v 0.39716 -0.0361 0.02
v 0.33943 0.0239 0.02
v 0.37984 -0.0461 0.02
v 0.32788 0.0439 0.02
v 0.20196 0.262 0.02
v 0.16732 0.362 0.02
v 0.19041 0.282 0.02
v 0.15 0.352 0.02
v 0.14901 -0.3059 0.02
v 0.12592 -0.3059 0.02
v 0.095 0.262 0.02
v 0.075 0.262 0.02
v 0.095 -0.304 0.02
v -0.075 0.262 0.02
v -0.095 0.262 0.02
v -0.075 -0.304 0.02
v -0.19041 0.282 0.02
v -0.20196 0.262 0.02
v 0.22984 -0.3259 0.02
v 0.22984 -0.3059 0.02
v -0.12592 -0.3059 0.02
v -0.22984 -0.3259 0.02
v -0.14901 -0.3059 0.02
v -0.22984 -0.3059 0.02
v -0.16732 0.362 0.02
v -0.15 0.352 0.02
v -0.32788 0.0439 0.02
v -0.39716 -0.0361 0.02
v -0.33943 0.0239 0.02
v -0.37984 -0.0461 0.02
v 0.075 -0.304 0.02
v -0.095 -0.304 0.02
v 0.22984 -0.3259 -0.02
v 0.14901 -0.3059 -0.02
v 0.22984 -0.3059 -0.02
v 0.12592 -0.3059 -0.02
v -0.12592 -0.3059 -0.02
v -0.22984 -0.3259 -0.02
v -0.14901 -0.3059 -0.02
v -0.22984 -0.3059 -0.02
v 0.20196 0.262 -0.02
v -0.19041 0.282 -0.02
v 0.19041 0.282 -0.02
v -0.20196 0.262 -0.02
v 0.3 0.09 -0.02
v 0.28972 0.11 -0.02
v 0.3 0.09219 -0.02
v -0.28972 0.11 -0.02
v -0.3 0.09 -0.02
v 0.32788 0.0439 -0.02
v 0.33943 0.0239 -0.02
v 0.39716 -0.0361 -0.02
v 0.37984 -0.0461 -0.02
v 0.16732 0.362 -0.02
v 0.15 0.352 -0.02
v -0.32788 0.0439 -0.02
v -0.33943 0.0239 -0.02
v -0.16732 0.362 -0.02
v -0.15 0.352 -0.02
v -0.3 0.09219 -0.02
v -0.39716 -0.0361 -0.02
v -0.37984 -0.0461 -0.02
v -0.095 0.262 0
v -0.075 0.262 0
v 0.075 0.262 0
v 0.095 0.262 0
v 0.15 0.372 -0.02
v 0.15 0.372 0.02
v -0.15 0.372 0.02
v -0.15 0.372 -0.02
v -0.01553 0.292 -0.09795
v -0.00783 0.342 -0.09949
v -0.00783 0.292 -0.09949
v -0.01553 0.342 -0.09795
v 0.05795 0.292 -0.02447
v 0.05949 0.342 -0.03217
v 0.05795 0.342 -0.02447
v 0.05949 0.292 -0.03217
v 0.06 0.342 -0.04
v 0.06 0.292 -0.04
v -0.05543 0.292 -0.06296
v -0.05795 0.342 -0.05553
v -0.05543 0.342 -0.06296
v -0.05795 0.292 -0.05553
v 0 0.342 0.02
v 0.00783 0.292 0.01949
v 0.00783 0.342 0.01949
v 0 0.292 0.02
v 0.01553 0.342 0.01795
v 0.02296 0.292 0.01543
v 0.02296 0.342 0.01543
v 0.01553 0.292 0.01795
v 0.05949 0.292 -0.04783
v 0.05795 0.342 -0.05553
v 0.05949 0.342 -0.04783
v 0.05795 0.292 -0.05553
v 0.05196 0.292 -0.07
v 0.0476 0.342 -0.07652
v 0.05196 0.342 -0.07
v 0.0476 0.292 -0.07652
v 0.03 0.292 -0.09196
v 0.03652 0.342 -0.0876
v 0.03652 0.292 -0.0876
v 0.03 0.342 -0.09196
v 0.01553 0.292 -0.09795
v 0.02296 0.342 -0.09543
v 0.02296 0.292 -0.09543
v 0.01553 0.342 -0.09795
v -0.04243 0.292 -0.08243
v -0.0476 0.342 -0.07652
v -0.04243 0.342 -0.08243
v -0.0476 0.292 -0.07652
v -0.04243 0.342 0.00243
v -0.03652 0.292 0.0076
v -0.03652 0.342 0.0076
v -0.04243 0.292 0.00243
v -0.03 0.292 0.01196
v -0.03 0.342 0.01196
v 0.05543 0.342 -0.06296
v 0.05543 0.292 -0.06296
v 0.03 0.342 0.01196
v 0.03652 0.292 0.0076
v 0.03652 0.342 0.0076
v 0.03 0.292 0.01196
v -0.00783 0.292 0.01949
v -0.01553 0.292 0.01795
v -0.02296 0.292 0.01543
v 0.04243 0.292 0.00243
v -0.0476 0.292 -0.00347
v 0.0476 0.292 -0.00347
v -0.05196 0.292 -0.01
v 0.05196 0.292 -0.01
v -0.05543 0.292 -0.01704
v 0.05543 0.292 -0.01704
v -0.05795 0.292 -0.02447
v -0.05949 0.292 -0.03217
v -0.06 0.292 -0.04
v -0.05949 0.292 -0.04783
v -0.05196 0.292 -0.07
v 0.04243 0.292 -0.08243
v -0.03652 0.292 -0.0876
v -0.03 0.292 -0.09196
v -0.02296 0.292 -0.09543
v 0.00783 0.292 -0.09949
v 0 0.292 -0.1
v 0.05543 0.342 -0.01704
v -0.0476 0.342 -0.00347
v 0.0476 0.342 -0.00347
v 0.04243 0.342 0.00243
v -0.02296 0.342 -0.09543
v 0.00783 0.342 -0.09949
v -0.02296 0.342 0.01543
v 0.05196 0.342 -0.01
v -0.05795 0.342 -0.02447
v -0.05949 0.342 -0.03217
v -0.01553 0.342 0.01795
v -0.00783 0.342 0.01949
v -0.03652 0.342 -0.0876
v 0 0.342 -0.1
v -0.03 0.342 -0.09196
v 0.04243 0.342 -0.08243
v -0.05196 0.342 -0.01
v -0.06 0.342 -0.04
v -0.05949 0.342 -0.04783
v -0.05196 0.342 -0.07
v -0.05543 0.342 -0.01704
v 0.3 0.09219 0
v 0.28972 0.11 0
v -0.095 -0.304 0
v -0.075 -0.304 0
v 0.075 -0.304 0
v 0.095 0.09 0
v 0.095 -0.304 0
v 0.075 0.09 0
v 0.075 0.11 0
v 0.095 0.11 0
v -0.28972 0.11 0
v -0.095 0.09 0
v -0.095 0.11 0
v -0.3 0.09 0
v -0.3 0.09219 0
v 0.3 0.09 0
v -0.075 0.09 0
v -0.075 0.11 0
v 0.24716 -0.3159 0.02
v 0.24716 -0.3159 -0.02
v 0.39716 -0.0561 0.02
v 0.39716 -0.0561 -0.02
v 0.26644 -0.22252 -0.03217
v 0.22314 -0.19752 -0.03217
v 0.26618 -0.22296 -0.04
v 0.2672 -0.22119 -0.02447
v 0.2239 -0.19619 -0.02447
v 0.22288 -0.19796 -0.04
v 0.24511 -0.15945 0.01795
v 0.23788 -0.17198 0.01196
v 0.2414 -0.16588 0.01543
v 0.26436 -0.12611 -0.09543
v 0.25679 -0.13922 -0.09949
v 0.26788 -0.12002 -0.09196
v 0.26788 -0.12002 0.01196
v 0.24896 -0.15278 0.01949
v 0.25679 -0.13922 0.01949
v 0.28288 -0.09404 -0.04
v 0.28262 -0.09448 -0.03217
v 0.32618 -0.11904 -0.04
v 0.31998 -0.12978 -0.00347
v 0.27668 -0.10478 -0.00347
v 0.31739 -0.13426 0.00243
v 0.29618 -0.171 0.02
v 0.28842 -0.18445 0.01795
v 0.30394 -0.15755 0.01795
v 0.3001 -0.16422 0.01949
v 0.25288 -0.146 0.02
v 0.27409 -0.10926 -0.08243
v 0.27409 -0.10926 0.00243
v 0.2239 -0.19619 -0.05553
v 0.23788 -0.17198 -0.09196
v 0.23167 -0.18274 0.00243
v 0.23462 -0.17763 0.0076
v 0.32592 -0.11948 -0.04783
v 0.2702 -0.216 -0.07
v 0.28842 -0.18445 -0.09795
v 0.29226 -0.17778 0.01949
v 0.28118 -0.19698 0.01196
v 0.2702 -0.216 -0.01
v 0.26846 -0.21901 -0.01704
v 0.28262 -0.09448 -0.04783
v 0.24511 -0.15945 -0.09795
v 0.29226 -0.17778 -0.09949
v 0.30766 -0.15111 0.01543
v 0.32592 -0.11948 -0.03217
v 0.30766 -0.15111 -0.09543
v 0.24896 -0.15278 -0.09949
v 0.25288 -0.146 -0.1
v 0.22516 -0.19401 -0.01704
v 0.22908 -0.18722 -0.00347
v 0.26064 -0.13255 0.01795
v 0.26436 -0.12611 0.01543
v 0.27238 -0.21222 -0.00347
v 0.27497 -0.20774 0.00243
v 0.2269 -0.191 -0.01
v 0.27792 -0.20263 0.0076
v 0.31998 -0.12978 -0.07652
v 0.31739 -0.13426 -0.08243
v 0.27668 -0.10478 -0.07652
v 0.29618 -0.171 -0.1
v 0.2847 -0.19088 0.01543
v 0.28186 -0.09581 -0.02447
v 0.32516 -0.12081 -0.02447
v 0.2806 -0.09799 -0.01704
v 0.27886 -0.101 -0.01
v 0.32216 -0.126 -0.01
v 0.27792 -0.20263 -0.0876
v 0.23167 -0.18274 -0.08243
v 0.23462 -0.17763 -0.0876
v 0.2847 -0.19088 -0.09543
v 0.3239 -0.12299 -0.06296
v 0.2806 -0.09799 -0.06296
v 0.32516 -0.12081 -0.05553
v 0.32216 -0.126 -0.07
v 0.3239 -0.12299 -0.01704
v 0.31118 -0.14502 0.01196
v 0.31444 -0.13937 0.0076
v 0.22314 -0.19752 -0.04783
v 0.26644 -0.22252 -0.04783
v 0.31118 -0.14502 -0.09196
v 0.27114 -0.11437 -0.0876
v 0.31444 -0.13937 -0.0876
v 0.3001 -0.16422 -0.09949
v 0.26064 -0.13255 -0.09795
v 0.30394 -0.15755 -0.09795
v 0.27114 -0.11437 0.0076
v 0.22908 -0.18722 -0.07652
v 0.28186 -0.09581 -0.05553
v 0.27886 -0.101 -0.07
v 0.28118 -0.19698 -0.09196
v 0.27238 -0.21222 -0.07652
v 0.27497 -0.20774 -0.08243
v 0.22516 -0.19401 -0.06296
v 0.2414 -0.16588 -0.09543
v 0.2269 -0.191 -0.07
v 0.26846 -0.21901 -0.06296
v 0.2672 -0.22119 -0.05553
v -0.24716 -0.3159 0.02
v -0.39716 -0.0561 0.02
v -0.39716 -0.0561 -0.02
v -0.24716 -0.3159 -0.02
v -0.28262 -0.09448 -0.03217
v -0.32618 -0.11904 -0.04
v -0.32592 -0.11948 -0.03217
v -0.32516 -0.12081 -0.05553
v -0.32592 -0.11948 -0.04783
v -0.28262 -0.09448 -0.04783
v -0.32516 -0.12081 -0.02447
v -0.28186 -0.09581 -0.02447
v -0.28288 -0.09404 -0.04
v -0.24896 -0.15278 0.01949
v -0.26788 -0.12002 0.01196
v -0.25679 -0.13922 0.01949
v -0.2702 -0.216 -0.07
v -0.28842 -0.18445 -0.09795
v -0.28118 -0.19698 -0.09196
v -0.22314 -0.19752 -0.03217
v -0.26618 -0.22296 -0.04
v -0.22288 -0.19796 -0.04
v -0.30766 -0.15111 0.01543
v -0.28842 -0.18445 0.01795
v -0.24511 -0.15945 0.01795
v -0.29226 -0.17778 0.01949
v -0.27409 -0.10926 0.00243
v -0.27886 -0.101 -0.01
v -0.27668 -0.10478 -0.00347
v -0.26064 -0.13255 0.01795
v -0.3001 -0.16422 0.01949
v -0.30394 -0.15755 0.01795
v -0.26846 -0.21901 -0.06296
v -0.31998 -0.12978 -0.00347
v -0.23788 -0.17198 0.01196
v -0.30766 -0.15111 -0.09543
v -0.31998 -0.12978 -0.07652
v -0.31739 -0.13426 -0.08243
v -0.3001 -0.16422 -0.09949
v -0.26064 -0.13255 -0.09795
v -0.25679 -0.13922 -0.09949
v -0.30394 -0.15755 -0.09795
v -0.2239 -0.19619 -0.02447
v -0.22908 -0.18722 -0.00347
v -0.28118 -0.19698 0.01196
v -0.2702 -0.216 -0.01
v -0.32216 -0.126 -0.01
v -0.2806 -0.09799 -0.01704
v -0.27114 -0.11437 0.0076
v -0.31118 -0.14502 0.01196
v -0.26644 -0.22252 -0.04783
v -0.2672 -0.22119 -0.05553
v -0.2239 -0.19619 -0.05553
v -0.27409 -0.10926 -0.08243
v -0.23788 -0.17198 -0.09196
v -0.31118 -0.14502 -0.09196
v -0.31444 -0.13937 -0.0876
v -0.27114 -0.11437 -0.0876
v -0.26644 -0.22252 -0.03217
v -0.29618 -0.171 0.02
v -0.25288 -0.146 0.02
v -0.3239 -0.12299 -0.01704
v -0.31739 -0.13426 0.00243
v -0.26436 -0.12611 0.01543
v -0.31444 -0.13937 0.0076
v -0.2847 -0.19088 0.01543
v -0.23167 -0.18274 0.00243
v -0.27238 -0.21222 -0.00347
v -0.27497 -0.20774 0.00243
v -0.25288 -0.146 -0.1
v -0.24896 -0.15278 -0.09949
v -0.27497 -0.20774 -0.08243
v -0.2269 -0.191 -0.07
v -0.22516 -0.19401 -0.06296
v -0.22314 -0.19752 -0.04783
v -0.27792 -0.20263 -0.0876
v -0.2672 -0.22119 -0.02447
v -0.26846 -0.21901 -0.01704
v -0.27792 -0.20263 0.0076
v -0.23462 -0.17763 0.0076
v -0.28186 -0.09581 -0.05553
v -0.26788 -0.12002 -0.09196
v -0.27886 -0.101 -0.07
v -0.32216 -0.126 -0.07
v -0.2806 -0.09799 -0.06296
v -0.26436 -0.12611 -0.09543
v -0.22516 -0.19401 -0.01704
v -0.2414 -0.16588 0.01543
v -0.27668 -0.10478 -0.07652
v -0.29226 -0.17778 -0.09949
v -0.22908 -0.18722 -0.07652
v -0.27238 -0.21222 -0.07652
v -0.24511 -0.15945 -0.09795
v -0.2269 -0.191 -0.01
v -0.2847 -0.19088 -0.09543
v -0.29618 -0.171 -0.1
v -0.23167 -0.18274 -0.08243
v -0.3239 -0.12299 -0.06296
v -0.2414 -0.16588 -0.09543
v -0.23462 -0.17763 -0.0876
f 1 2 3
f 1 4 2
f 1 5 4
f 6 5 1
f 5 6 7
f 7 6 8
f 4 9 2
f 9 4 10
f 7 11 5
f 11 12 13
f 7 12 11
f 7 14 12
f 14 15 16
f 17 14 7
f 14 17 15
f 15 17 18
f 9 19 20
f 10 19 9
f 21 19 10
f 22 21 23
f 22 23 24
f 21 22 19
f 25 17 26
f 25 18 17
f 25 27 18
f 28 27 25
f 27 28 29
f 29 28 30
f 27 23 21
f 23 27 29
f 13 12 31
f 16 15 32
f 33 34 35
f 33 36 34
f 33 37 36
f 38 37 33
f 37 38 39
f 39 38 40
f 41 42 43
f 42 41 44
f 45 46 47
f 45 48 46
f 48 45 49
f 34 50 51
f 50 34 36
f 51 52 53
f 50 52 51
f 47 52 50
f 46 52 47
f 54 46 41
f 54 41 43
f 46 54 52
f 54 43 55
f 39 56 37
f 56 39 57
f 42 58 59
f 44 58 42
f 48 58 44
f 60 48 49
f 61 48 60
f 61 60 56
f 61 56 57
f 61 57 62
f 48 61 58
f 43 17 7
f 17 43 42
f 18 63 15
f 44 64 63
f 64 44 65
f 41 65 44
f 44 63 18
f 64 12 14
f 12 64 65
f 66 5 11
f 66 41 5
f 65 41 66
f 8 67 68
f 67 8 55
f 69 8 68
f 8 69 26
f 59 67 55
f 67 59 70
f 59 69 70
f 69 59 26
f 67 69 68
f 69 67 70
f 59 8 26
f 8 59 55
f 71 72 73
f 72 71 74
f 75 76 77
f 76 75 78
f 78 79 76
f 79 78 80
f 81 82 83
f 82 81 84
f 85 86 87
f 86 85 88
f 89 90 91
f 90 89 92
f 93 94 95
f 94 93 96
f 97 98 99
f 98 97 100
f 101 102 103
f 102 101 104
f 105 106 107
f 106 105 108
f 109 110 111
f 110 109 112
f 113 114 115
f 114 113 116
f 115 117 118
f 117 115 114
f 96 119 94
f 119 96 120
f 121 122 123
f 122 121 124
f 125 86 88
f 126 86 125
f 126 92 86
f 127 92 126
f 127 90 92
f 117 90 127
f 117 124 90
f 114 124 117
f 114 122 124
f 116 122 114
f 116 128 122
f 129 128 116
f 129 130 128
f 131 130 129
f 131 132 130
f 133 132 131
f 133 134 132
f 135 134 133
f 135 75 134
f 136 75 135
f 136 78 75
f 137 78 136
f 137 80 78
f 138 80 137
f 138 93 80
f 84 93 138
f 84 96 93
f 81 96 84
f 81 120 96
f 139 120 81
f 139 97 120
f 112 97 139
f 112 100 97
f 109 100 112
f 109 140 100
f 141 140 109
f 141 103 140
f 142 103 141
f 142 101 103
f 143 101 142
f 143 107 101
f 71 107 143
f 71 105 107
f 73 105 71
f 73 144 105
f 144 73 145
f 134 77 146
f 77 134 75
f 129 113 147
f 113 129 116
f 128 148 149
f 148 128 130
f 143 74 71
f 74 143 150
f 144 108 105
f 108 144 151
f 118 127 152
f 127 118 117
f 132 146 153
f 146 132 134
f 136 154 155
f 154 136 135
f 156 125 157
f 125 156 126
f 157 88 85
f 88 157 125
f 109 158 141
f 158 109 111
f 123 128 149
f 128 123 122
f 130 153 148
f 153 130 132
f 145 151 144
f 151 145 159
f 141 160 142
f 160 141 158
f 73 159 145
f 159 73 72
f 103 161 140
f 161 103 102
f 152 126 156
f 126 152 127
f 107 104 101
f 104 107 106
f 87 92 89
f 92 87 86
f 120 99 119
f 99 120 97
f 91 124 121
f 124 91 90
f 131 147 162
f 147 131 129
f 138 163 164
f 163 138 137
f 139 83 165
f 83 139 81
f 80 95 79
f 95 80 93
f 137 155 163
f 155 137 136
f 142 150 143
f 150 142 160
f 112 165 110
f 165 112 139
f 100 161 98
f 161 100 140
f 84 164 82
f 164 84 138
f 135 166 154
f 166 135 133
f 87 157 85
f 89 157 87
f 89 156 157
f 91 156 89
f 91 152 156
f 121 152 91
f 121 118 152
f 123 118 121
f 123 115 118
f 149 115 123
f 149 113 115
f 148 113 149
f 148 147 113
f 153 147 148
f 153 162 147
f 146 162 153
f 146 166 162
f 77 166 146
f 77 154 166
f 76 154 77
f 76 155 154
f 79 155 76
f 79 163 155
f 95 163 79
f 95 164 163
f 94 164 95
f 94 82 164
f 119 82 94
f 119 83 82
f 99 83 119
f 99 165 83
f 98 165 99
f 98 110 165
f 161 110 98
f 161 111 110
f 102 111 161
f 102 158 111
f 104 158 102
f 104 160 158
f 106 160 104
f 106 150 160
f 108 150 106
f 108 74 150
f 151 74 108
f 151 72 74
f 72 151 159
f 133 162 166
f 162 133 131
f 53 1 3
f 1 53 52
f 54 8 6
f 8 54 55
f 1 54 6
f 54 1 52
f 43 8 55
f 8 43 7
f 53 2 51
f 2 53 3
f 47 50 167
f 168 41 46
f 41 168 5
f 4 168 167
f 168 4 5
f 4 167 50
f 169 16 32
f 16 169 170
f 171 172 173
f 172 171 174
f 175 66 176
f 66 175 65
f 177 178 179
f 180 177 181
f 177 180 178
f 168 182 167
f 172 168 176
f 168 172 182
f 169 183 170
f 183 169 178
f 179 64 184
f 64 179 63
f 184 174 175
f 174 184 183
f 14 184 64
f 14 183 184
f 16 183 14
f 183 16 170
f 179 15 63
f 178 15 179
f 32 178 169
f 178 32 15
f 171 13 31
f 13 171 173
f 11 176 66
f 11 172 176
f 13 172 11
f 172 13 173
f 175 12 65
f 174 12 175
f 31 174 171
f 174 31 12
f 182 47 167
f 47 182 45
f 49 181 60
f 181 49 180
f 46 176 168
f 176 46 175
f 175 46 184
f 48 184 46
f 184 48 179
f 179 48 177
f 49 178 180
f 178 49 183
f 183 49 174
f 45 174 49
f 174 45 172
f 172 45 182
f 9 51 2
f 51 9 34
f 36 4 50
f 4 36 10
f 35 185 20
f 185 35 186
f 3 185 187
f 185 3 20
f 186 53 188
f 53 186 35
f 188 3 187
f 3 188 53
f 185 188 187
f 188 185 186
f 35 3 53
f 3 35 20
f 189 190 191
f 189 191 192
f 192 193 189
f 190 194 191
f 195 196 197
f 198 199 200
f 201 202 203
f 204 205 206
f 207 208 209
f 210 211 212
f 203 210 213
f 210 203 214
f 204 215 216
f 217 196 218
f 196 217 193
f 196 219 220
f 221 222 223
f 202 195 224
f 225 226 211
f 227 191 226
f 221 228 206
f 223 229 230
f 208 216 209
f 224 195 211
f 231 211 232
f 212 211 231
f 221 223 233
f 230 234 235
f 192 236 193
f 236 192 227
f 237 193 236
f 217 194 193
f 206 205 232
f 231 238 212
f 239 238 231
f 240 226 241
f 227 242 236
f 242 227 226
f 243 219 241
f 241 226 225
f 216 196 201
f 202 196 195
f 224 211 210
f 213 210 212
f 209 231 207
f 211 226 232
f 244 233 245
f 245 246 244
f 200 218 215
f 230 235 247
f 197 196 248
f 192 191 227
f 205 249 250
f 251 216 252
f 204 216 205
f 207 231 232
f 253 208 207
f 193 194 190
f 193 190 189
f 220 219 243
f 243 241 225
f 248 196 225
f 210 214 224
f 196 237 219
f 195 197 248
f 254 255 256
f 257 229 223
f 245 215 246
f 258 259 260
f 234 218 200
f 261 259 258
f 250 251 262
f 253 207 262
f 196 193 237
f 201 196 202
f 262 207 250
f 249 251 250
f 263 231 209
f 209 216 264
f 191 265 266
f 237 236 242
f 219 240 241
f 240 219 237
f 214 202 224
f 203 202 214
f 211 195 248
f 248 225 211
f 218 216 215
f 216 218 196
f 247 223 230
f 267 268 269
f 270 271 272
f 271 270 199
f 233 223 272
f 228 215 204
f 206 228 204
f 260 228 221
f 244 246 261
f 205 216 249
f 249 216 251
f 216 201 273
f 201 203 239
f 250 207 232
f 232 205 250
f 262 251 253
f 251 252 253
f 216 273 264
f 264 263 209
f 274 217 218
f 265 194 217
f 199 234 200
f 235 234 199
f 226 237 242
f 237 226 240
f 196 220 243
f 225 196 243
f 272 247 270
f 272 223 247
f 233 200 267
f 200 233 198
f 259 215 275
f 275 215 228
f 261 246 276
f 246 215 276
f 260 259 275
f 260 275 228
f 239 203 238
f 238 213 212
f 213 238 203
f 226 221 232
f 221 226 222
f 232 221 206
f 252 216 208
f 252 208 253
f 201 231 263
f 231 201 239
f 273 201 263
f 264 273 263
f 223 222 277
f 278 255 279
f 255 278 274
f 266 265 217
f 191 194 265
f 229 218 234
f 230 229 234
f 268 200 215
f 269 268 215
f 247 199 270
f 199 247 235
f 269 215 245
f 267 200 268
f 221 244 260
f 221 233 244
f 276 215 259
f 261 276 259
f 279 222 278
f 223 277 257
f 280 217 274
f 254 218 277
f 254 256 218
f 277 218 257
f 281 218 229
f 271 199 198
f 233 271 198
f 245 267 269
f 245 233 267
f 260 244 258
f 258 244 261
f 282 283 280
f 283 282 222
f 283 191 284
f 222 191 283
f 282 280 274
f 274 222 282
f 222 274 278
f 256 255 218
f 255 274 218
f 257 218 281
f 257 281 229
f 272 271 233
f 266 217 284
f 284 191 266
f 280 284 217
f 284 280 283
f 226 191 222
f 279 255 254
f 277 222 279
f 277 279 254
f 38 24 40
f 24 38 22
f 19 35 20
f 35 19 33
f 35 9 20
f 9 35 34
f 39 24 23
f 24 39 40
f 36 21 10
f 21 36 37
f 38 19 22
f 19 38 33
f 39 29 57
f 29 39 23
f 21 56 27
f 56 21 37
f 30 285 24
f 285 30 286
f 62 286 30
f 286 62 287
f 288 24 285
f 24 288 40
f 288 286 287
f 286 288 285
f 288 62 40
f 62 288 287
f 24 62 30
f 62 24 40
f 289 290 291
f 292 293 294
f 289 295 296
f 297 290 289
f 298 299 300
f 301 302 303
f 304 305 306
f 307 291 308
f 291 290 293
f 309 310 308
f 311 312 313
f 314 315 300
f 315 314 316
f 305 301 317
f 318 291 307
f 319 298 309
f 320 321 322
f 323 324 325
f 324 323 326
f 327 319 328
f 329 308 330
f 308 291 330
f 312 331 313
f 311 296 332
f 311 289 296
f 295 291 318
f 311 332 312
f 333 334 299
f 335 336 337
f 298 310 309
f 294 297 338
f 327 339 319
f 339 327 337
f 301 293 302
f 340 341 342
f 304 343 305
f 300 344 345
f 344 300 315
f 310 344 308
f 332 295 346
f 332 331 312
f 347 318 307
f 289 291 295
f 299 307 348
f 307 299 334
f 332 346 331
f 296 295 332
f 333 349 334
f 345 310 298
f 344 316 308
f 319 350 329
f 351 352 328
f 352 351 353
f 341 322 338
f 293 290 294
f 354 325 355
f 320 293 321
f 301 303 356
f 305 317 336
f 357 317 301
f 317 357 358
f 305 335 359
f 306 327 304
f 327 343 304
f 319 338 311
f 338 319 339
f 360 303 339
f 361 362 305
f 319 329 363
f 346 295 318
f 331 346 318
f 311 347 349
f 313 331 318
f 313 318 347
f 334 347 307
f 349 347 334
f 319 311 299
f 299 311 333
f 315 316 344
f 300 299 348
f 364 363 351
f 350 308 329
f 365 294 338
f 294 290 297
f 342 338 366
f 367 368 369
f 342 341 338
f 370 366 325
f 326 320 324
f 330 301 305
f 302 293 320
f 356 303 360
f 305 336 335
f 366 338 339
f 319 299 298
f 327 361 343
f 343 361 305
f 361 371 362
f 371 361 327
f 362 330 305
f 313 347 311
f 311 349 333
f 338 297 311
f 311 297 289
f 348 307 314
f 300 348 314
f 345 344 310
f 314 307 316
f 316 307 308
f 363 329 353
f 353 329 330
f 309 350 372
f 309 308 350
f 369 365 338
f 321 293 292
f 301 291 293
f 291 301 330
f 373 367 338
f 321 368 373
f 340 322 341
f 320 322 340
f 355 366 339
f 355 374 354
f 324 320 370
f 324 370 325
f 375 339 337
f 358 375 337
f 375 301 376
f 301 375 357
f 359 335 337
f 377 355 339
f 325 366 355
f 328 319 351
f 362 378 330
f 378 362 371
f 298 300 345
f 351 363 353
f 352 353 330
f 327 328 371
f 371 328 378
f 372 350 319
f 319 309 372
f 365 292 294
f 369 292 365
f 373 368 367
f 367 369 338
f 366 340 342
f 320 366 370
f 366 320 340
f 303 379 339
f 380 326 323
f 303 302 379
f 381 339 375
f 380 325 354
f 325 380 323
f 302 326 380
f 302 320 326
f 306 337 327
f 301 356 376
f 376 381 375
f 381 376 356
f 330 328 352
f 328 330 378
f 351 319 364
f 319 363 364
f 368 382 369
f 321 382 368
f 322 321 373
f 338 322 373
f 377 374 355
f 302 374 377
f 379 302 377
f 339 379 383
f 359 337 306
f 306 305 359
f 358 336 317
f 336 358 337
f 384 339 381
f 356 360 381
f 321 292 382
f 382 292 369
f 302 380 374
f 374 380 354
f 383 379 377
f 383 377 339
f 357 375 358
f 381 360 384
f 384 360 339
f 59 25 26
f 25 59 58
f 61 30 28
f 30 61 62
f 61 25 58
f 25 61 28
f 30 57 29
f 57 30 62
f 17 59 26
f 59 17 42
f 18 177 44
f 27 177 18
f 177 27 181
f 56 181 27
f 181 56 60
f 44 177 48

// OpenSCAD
// Generated by SolidPython 1.1.3 on 2023-11-28 11:05:10
$fn = 48;


union() {
	union() {
		color(alpha = 1.0000000000, c = "Red") {
			translate(v = [0.   ,0.272,0.   ]) {
				rotate(a = [0, 0, -0.0000000000]) {
					cube(center = true, size = [0.41547005383792507, 0.0200000000, 0.0400000000]);
				}
			}
		}
	}
	union() {
		color(alpha = 1.0000000000, c = "Orange") {
			translate(v = [0.   ,0.362,0.   ]) {
				rotate(a = [0, 0, -0.0000000000]) {
					cube(center = true, size = [0.3000000000, 0.0200000000, 0.0400000000]);
				}
			}
		}
	}
	union() {
		color(alpha = 1.0000000000, c = "Green") {
			translate(v = [ 0.   , 0.317,-0.04 ]) {
				rotate(a = [90, 0, -0.0000000000]) {
					cylinder(center = true, h = 0.0500000000, r = 0.0600000000);
				}
			}
		}
	}
	union() {
		color(alpha = 1.0000000000, c = "Purple") {
			translate(v = [0.27358073,0.15795191,0.        ]) {
				rotate(a = [0, 0, -60.0000000000]) {
					cube(center = true, size = [0.4596818842642447, 0.0200000000, 0.0400000000]);
				}
			}
		}
	}
	union() {
		color(alpha = 1.0000000000, c = "Yellow") {
			translate(v = [-0.0850000000, -0.0200000000, 0.0100000000]) {
				rotate(a = [0, 0, -90]) {
					cube(center = true, size = [0.5680000000, 0.0200000000, 0.0200000000]);
				}
			}
		}
	}
	union() {
		color(alpha = 1.0000000000, c = "Yellow") {
			translate(v = [0.0850000000, -0.0200000000, 0.0100000000]) {
				rotate(a = [0, 0, -90]) {
					cube(center = true, size = [0.5680000000, 0.0200000000, 0.0200000000]);
				}
			}
		}
	}
	union() {
		color(alpha = 1.0000000000, c = "Yellow") {
			translate(v = [0, 0.1000000000, -0.0100000000]) {
				cube(center = true, size = [0.6000000000, 0.0200000000, 0.0200000000]);
			}
		}
	}
	union() {
		color(alpha = 1.0000000000, c = "Red") {
			translate(v = [ 0.23555891,-0.136     , 0.        ]) {
				rotate(a = [0, 0, -120.0000000000]) {
					cube(center = true, size = [0.41547005383792507, 0.0200000000, 0.0400000000]);
				}
			}
		}
	}
	union() {
		color(alpha = 1.0000000000, c = "Orange") {
			translate(v = [ 0.3135012,-0.181    , 0.       ]) {
				rotate(a = [0, 0, -120.0000000000]) {
					cube(center = true, size = [0.3000000000, 0.0200000000, 0.0400000000]);
				}
			}
		}
	}
	union() {
		color(alpha = 1.0000000000, c = "Green") {
			translate(v = [ 0.27453005,-0.1585    ,-0.04      ]) {
				rotate(a = [90, 0, -120.0000000000]) {
					cylinder(center = true, h = 0.0500000000, r = 0.0600000000);
				}
			}
		}
	}
	union() {
		color(alpha = 1.0000000000, c = "Purple") {
			translate(v = [ 3.86870590e-17,-3.15903811e-01, 0.00000000e+00]) {
				rotate(a = [0, 0, -180.0000000000]) {
					cube(center = true, size = [0.4596818842642447, 0.0200000000, 0.0400000000]);
				}
			}
		}
	}
	union() {
		color(alpha = 1.0000000000, c = "Yellow") {
			translate(v = [-0.0850000000, -0.0200000000, 0.0100000000]) {
				rotate(a = [0, 0, -90]) {
					cube(center = true, size = [0.5680000000, 0.0200000000, 0.0200000000]);
				}
			}
		}
	}
	union() {
		color(alpha = 1.0000000000, c = "Yellow") {
			translate(v = [0.0850000000, -0.0200000000, 0.0100000000]) {
				rotate(a = [0, 0, -90]) {
					cube(center = true, size = [0.5680000000, 0.0200000000, 0.0200000000]);
				}
			}
		}
	}
	union() {
		color(alpha = 1.0000000000, c = "Yellow") {
			translate(v = [0, 0.1000000000, -0.0100000000]) {
				cube(center = true, size = [0.6000000000, 0.0200000000, 0.0200000000]);
			}
		}
	}
	union() {
		color(alpha = 1.0000000000, c = "Red") {
			translate(v = [-0.23555891,-0.136     , 0.        ]) {
				rotate(a = [0, 0, -240.0000000000]) {
					cube(center = true, size = [0.41547005383792507, 0.0200000000, 0.0400000000]);
				}
			}
		}
	}
	union() {
		color(alpha = 1.0000000000, c = "Orange") {
			translate(v = [-0.3135012,-0.181    , 0.       ]) {
				rotate(a = [0, 0, -240.0000000000]) {
					cube(center = true, size = [0.3000000000, 0.0200000000, 0.0400000000]);
				}
			}
		}
	}
	union() {
		color(alpha = 1.0000000000, c = "Green") {
			translate(v = [-0.27453005,-0.1585    ,-0.04      ]) {
				rotate(a = [90, 0, -240.0000000000]) {
					cylinder(center = true, h = 0.0500000000, r = 0.0600000000);
				}
			}
		}
	}
	union() {
		color(alpha = 1.0000000000, c = "Purple") {
			translate(v = [-0.27358073, 0.15795191, 0.        ]) {
				rotate(a = [0, 0, -300.0000000000]) {
					cube(center = true, size = [0.4596818842642447, 0.0200000000, 0.0400000000]);
				}
			}
		}
	}
	union() {
		color(alpha = 1.0000000000, c = "Yellow") {
			translate(v = [-0.0850000000, -0.0200000000, 0.0100000000]) {
				rotate(a = [0, 0, -90]) {
					cube(center = true, size = [0.5680000000, 0.0200000000, 0.0200000000]);
				}
			}
		}
	}
	union() {
		color(alpha = 1.0000000000, c = "Yellow") {
			translate(v = [0.0850000000, -0.0200000000, 0.0100000000]) {
				rotate(a = [0, 0, -90]) {
					cube(center = true, size = [0.5680000000, 0.0200000000, 0.0200000000]);
				}
			}
		}
	}
	union() {
		color(alpha = 1.0000000000, c = "Yellow") {
			translate(v = [0, 0.1000000000, -0.0100000000]) {
				cube(center = true, size = [0.6000000000, 0.0200000000, 0.0200000000]);
			}
		}
	}
}
/***********************************************
*********      SolidPython code:      **********
************************************************
 
#! /usr/bin/env python3
import sys
import numpy as np
from solid import scad_render_to_file
from solid.objects import cube, translate, union, rotate, color, cylinder

SEGMENTS = 48

radial_vector0 = np.array([31., -19., 0.])
radial_vector0 /= np.linalg.norm(radial_vector0)
radial_vector1 = np.array([-31., -19., 0.])
radial_vector1 /= np.linalg.norm(radial_vector1)

side_count = 3
step_angle = 360/side_count
step_angle_rad = np.deg2rad(step_angle)
rad_size = .3  # Length from center to outer wheel
piece_width = .02  # cm
hpw = piece_width*.5

wheel_gap = .09
ctiw = .352  # Center to inner wheel support
ctow = ctiw-wheel_gap  # Center to outer wheel support
wsl = .3  # Wheel support length

p1 = np.array([wsl*.5, ctiw, 0.])
p2 = np.array([np.sin(step_angle_rad), np.cos(step_angle_rad), 0.]) * ctiw - \
    np.array([np.sin(step_angle_rad+np.pi*.5),
             np.cos(step_angle_rad+np.pi*.5), 0.]) * wsl*.5
boll = np.linalg.norm(p1-p2)  # Big outer lines length
bolr = np.linalg.norm((p1+p2)*.5)  # Big outer lines rad length

# Inner inner wheel support
iiwsl = wsl+((wheel_gap+piece_width*.5) *
             np.tan((side_count*2-2)*np.pi/(side_count*2)-np.pi*.5))*2
print(iiwsl)


def rotate_vec(vec, angle):
    angle = np.deg2rad(angle)
    new_vec = np.copy(vec)
    new_vec[0] = vec[0] * np.cos(angle) - vec[1] * np.sin(angle)
    new_vec[1] = vec[0] * np.sin(angle) + vec[1] * np.cos(angle)
    return new_vec


def basic_geometry():

    shapes = []
    for i in range(side_count):
        dir_vector = np.array(
            [np.sin(i*step_angle_rad), np.cos(i*step_angle_rad), 0.])
        rot = -step_angle*i
        outer_wheel_support = union()(
            color("Red")(
                translate(dir_vector*(ctow+hpw))(
                    rotate((0, 0, rot))(
                        cube([iiwsl, piece_width, piece_width*2], center=True)))))
        shapes.append(outer_wheel_support)
        inner_wheel_support = union()(
            color("Orange")(
                translate(dir_vector*(ctiw+hpw))(
                    rotate((0, 0, rot))(
                        cube([wsl, piece_width, piece_width*2], center=True)))))
        shapes.append(inner_wheel_support)

        # Wheels
        wheel_pos = ((dir_vector*(ctow+hpw))+(dir_vector*(ctiw+hpw)))*.5
        wheel_pos[2] -= .04
        wheel = union()(
            color("Green")(
                translate(wheel_pos)(
                    rotate((90, 0, rot))(
                        cylinder(r=.06, h=.05, center=True)))))
        shapes.append(wheel)

        dir_vector = np.array([np.sin(i*step_angle_rad+step_angle_rad*.5),
                              np.cos(i*step_angle_rad+step_angle_rad*.5), 0.])
        rot -= step_angle*.5
        big_outer_line = union()(
            color("Purple")(
                translate(dir_vector*(bolr+hpw))(
                    rotate((0, 0, rot))(
                        cube([boll, piece_width, piece_width*2], center=True)))))
        shapes.append(big_outer_line)

        vertical_bar1 = union()(
            color("Yellow")(
                translate([-.085, -.02, .01])(
                    rotate((0, 0, -90))(
                        cube([.568, piece_width, piece_width], center=True)))))
        shapes.append(vertical_bar1)

        vertical_bar2 = union()(
            color("Yellow")(
                translate([.085, -.02, .01])(
                    rotate((0, 0, -90))(
                        cube([.568, piece_width, piece_width], center=True)))))
        shapes.append(vertical_bar2)

        horizontal_bar = union()(
            color("Yellow")(
                translate([0, .1, -.01])(
                    cube([.6, piece_width, piece_width], center=True))))
        shapes.append(horizontal_bar)
        """
        battery_pack = union()(
            color("Blue")(
                translate([.12, .1, .1])(
                    cube([.18, .135, .2], center=True))))
        shapes.append(battery_pack)"""

    """
    print(f"Red:         {wsl:.1f} cm")
    print(f"Orange:      {wsl:.1f} cm")
    print(f"Yellow:      {cil:.1f} cm - angle cut")
    print(f"Green:       {rcl:.1f} cm")
    print(f"Blue:         {wssl:.1f} cm")
    print(f"Purple:      {boll:.1f} cm")
    print("--------------------------")
    print(f"Diameter:   {(np.linalg.norm(np.array([wsl*.5, ctow]))*2):.1f} cm")
    """
    print(f"Orange:      {(wsl*100):.1f} cm")
    print(f"Purple:      {(boll*100):.1f} cm")
    print(f"Red:         {(iiwsl*100):.1f} cm")

    return union()(*shapes)


if __name__ == '__main__':
    out_dir = sys.argv[1] if len(sys.argv) > 1 else None

    a = basic_geometry()

    # Adding the file_header argument as shown allows you to change
    # the detail of arcs by changing the SEGMENTS variable.  This can
    # be expensive when making lots of small curves, but is otherwise
    # useful.
    file_out = scad_render_to_file(
        a, out_dir=out_dir, file_header=f'$fn = {SEGMENTS};')
    print(f"{__file__}: SCAD file written to: \n{file_out}")
 
 
************************************************/
